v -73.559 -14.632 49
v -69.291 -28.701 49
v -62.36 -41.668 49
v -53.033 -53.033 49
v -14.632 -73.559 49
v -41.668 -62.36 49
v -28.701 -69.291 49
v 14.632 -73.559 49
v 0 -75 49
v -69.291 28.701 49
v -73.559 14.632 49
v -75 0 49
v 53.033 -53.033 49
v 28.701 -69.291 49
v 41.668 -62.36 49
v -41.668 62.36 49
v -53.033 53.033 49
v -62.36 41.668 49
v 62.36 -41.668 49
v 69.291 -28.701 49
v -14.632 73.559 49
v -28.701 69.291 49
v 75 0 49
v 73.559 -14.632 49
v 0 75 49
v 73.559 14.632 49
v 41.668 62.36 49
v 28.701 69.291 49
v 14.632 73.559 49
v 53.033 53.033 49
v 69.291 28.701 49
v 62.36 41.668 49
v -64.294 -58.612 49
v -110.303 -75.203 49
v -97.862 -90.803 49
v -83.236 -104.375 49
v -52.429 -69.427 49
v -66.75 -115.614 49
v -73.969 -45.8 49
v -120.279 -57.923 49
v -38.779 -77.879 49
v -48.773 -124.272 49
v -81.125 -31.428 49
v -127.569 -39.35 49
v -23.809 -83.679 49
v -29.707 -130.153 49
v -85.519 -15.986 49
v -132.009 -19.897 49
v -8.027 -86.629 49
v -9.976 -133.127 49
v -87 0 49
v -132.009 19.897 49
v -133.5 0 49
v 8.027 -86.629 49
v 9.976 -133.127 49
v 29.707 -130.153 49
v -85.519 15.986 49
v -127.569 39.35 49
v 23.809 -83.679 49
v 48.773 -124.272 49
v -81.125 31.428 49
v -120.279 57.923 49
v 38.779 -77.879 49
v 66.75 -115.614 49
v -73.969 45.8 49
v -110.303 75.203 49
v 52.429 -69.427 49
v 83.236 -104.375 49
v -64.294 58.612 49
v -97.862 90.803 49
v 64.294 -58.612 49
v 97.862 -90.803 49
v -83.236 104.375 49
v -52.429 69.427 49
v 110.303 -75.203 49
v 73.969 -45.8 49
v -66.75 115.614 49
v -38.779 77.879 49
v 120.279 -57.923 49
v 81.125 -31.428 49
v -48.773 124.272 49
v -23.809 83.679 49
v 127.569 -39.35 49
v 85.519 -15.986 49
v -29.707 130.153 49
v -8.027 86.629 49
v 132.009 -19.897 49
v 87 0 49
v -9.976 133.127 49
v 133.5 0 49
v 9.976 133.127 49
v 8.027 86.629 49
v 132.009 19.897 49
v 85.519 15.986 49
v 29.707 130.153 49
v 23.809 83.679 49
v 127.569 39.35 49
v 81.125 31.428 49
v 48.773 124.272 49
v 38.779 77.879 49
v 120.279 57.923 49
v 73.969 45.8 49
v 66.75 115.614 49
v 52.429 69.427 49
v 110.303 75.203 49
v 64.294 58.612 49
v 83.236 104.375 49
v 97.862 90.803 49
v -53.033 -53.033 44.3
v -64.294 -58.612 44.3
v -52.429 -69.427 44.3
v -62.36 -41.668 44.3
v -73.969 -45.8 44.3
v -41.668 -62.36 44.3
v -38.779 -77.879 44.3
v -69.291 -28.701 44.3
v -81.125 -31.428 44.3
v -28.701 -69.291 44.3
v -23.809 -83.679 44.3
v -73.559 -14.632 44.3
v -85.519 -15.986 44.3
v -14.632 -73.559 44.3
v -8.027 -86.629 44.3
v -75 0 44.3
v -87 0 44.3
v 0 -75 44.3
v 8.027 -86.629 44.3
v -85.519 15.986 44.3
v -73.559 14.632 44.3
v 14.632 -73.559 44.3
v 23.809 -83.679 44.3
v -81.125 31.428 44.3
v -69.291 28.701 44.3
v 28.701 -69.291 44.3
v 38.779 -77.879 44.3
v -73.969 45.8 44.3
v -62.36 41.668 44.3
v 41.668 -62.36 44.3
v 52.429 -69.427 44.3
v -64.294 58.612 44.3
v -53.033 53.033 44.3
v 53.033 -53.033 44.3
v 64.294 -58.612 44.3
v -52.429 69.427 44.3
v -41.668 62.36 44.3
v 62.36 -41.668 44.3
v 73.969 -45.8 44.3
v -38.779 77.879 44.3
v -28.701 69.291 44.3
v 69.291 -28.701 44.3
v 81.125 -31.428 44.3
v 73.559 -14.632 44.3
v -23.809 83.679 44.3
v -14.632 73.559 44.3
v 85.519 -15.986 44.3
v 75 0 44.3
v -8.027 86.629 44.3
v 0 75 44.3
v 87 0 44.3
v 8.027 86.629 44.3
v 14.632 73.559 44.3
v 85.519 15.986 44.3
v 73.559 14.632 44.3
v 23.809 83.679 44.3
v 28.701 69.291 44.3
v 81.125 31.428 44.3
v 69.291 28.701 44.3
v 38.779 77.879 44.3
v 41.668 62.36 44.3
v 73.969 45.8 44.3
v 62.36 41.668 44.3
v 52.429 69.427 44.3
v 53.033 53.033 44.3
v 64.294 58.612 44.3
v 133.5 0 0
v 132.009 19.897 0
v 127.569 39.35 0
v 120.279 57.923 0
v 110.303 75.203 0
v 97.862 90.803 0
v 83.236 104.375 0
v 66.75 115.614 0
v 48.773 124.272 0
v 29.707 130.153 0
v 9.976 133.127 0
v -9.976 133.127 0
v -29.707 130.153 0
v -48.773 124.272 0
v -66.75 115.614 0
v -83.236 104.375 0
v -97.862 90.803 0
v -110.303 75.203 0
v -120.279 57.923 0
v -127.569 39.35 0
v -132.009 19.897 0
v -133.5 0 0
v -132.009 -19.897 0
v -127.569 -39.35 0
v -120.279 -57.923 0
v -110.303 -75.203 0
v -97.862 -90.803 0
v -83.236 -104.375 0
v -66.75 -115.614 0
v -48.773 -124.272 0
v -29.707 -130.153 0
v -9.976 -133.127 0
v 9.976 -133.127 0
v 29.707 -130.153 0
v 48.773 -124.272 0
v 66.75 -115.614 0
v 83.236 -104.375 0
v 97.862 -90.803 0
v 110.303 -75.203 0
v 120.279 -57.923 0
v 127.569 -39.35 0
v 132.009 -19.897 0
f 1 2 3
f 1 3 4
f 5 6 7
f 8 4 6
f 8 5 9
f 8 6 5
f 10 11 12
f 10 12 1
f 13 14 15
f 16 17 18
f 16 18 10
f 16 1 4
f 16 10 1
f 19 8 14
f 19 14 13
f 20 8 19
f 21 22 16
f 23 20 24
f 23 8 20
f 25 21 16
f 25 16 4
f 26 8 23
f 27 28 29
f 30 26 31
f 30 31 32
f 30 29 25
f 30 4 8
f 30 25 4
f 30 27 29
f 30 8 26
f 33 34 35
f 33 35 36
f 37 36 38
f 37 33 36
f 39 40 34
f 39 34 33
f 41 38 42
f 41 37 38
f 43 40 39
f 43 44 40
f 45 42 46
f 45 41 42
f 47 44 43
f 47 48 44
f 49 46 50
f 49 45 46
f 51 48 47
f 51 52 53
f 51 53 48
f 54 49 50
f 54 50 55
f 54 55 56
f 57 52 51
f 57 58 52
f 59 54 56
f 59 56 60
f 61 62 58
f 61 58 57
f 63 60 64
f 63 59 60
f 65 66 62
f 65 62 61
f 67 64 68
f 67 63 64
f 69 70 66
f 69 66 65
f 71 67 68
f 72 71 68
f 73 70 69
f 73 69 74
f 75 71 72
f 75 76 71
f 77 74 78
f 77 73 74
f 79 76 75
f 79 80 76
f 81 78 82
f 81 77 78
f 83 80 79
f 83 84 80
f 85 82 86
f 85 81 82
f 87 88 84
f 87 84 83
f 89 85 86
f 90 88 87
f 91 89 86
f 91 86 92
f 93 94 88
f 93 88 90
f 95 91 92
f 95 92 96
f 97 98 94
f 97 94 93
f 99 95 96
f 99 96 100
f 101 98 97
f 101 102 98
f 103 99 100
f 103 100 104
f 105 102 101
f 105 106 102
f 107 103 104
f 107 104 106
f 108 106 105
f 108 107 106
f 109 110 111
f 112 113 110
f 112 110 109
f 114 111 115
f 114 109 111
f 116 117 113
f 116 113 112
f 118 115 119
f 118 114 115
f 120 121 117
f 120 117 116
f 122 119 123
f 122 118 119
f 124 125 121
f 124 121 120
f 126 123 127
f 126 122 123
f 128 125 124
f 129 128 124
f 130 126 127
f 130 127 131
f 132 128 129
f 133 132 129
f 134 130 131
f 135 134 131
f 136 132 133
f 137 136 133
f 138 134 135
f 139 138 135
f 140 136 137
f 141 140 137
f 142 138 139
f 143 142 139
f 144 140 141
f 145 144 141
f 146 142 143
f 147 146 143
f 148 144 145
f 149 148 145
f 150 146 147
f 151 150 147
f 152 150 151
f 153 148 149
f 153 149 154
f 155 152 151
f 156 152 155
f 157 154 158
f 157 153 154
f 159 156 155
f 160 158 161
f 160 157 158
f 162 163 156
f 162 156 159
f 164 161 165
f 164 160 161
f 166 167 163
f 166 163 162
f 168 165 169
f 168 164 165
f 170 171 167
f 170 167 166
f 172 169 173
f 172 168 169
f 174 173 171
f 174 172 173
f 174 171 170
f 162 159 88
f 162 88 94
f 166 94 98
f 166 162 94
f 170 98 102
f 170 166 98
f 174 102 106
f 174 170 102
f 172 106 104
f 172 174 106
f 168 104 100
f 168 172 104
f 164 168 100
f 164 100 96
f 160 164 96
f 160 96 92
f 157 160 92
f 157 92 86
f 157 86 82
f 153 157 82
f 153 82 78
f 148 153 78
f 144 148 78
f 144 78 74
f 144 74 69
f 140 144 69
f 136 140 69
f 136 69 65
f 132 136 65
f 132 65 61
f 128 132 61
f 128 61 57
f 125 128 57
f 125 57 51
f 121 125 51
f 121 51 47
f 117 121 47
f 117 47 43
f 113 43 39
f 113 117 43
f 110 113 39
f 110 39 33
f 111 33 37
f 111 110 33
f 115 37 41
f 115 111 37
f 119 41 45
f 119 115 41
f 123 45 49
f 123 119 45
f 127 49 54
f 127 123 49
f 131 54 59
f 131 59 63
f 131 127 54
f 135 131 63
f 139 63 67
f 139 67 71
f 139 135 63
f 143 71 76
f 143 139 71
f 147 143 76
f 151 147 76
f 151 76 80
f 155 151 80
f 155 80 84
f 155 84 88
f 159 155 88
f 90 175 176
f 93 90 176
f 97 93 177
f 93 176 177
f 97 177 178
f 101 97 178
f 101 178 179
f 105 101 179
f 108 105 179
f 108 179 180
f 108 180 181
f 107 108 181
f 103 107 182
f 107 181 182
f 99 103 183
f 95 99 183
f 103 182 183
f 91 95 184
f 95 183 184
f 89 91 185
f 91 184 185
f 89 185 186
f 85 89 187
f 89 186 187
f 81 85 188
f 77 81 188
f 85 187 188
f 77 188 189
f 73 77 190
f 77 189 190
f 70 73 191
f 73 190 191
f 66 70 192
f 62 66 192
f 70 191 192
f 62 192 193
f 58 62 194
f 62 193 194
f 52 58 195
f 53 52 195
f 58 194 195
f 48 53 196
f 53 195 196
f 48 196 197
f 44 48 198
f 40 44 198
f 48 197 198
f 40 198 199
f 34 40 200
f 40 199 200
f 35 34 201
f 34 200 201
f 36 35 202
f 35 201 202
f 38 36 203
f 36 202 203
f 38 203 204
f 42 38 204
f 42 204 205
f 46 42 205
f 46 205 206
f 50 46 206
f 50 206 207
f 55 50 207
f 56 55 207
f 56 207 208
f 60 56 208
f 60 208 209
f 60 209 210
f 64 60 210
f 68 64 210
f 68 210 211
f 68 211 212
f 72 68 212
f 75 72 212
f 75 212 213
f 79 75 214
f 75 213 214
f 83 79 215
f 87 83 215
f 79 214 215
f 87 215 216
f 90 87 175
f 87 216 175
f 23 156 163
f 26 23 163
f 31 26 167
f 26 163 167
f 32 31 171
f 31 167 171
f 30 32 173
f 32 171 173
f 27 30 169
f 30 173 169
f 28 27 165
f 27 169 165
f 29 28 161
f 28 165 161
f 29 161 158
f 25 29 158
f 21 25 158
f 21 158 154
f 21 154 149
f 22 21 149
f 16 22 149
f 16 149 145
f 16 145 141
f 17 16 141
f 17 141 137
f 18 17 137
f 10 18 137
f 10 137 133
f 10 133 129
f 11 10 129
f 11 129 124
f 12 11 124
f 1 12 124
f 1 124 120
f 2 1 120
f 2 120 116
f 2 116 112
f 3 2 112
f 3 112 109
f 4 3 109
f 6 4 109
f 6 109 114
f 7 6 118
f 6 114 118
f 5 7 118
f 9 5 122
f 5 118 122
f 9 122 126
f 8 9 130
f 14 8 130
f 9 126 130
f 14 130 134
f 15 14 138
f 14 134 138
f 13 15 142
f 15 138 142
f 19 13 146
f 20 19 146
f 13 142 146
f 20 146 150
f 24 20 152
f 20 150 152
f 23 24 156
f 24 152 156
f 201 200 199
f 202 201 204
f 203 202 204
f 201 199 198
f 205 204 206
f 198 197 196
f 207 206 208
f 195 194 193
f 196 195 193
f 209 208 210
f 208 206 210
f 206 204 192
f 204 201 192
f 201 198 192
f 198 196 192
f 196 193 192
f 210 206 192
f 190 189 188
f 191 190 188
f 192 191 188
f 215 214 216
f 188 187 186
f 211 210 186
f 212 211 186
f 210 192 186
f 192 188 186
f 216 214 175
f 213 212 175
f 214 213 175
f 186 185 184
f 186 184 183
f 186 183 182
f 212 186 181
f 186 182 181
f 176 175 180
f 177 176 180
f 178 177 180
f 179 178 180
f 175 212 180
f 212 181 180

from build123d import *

# Parameters (mm, degrees)
SKETCH1_R           = 75
BOSS_EXTRUDE1_DEPTH = 49
SKETCH1_3_R         = 87
SKETCH1_3_R_2       = 75
BOSS_EXTRUDE2_DEPTH = 44.3
SKETCH1_4_R         = 133.5
SKETCH1_4_R_2       = 87
BOSS_EXTRUDE3_DEPTH = 49


with BuildPart() as part:
    # Sketch1 → Boss-Extrude1 (new body)
    with BuildSketch(Plane.XY):
        Circle(SKETCH1_R)
    extrude(amount=BOSS_EXTRUDE1_DEPTH)

    # Sketch1<3> → Boss-Extrude2 (add)
    with BuildSketch(Plane.XY):
        Circle(SKETCH1_3_R)
        Circle(SKETCH1_3_R_2, mode=Mode.SUBTRACT)
    extrude(amount=BOSS_EXTRUDE2_DEPTH)

    # Sketch1<4> → Boss-Extrude3 (add)
    with BuildSketch(Plane.XY):
        Circle(SKETCH1_4_R)
        Circle(SKETCH1_4_R_2, mode=Mode.SUBTRACT)
    extrude(amount=BOSS_EXTRUDE3_DEPTH)


solid = part.part
